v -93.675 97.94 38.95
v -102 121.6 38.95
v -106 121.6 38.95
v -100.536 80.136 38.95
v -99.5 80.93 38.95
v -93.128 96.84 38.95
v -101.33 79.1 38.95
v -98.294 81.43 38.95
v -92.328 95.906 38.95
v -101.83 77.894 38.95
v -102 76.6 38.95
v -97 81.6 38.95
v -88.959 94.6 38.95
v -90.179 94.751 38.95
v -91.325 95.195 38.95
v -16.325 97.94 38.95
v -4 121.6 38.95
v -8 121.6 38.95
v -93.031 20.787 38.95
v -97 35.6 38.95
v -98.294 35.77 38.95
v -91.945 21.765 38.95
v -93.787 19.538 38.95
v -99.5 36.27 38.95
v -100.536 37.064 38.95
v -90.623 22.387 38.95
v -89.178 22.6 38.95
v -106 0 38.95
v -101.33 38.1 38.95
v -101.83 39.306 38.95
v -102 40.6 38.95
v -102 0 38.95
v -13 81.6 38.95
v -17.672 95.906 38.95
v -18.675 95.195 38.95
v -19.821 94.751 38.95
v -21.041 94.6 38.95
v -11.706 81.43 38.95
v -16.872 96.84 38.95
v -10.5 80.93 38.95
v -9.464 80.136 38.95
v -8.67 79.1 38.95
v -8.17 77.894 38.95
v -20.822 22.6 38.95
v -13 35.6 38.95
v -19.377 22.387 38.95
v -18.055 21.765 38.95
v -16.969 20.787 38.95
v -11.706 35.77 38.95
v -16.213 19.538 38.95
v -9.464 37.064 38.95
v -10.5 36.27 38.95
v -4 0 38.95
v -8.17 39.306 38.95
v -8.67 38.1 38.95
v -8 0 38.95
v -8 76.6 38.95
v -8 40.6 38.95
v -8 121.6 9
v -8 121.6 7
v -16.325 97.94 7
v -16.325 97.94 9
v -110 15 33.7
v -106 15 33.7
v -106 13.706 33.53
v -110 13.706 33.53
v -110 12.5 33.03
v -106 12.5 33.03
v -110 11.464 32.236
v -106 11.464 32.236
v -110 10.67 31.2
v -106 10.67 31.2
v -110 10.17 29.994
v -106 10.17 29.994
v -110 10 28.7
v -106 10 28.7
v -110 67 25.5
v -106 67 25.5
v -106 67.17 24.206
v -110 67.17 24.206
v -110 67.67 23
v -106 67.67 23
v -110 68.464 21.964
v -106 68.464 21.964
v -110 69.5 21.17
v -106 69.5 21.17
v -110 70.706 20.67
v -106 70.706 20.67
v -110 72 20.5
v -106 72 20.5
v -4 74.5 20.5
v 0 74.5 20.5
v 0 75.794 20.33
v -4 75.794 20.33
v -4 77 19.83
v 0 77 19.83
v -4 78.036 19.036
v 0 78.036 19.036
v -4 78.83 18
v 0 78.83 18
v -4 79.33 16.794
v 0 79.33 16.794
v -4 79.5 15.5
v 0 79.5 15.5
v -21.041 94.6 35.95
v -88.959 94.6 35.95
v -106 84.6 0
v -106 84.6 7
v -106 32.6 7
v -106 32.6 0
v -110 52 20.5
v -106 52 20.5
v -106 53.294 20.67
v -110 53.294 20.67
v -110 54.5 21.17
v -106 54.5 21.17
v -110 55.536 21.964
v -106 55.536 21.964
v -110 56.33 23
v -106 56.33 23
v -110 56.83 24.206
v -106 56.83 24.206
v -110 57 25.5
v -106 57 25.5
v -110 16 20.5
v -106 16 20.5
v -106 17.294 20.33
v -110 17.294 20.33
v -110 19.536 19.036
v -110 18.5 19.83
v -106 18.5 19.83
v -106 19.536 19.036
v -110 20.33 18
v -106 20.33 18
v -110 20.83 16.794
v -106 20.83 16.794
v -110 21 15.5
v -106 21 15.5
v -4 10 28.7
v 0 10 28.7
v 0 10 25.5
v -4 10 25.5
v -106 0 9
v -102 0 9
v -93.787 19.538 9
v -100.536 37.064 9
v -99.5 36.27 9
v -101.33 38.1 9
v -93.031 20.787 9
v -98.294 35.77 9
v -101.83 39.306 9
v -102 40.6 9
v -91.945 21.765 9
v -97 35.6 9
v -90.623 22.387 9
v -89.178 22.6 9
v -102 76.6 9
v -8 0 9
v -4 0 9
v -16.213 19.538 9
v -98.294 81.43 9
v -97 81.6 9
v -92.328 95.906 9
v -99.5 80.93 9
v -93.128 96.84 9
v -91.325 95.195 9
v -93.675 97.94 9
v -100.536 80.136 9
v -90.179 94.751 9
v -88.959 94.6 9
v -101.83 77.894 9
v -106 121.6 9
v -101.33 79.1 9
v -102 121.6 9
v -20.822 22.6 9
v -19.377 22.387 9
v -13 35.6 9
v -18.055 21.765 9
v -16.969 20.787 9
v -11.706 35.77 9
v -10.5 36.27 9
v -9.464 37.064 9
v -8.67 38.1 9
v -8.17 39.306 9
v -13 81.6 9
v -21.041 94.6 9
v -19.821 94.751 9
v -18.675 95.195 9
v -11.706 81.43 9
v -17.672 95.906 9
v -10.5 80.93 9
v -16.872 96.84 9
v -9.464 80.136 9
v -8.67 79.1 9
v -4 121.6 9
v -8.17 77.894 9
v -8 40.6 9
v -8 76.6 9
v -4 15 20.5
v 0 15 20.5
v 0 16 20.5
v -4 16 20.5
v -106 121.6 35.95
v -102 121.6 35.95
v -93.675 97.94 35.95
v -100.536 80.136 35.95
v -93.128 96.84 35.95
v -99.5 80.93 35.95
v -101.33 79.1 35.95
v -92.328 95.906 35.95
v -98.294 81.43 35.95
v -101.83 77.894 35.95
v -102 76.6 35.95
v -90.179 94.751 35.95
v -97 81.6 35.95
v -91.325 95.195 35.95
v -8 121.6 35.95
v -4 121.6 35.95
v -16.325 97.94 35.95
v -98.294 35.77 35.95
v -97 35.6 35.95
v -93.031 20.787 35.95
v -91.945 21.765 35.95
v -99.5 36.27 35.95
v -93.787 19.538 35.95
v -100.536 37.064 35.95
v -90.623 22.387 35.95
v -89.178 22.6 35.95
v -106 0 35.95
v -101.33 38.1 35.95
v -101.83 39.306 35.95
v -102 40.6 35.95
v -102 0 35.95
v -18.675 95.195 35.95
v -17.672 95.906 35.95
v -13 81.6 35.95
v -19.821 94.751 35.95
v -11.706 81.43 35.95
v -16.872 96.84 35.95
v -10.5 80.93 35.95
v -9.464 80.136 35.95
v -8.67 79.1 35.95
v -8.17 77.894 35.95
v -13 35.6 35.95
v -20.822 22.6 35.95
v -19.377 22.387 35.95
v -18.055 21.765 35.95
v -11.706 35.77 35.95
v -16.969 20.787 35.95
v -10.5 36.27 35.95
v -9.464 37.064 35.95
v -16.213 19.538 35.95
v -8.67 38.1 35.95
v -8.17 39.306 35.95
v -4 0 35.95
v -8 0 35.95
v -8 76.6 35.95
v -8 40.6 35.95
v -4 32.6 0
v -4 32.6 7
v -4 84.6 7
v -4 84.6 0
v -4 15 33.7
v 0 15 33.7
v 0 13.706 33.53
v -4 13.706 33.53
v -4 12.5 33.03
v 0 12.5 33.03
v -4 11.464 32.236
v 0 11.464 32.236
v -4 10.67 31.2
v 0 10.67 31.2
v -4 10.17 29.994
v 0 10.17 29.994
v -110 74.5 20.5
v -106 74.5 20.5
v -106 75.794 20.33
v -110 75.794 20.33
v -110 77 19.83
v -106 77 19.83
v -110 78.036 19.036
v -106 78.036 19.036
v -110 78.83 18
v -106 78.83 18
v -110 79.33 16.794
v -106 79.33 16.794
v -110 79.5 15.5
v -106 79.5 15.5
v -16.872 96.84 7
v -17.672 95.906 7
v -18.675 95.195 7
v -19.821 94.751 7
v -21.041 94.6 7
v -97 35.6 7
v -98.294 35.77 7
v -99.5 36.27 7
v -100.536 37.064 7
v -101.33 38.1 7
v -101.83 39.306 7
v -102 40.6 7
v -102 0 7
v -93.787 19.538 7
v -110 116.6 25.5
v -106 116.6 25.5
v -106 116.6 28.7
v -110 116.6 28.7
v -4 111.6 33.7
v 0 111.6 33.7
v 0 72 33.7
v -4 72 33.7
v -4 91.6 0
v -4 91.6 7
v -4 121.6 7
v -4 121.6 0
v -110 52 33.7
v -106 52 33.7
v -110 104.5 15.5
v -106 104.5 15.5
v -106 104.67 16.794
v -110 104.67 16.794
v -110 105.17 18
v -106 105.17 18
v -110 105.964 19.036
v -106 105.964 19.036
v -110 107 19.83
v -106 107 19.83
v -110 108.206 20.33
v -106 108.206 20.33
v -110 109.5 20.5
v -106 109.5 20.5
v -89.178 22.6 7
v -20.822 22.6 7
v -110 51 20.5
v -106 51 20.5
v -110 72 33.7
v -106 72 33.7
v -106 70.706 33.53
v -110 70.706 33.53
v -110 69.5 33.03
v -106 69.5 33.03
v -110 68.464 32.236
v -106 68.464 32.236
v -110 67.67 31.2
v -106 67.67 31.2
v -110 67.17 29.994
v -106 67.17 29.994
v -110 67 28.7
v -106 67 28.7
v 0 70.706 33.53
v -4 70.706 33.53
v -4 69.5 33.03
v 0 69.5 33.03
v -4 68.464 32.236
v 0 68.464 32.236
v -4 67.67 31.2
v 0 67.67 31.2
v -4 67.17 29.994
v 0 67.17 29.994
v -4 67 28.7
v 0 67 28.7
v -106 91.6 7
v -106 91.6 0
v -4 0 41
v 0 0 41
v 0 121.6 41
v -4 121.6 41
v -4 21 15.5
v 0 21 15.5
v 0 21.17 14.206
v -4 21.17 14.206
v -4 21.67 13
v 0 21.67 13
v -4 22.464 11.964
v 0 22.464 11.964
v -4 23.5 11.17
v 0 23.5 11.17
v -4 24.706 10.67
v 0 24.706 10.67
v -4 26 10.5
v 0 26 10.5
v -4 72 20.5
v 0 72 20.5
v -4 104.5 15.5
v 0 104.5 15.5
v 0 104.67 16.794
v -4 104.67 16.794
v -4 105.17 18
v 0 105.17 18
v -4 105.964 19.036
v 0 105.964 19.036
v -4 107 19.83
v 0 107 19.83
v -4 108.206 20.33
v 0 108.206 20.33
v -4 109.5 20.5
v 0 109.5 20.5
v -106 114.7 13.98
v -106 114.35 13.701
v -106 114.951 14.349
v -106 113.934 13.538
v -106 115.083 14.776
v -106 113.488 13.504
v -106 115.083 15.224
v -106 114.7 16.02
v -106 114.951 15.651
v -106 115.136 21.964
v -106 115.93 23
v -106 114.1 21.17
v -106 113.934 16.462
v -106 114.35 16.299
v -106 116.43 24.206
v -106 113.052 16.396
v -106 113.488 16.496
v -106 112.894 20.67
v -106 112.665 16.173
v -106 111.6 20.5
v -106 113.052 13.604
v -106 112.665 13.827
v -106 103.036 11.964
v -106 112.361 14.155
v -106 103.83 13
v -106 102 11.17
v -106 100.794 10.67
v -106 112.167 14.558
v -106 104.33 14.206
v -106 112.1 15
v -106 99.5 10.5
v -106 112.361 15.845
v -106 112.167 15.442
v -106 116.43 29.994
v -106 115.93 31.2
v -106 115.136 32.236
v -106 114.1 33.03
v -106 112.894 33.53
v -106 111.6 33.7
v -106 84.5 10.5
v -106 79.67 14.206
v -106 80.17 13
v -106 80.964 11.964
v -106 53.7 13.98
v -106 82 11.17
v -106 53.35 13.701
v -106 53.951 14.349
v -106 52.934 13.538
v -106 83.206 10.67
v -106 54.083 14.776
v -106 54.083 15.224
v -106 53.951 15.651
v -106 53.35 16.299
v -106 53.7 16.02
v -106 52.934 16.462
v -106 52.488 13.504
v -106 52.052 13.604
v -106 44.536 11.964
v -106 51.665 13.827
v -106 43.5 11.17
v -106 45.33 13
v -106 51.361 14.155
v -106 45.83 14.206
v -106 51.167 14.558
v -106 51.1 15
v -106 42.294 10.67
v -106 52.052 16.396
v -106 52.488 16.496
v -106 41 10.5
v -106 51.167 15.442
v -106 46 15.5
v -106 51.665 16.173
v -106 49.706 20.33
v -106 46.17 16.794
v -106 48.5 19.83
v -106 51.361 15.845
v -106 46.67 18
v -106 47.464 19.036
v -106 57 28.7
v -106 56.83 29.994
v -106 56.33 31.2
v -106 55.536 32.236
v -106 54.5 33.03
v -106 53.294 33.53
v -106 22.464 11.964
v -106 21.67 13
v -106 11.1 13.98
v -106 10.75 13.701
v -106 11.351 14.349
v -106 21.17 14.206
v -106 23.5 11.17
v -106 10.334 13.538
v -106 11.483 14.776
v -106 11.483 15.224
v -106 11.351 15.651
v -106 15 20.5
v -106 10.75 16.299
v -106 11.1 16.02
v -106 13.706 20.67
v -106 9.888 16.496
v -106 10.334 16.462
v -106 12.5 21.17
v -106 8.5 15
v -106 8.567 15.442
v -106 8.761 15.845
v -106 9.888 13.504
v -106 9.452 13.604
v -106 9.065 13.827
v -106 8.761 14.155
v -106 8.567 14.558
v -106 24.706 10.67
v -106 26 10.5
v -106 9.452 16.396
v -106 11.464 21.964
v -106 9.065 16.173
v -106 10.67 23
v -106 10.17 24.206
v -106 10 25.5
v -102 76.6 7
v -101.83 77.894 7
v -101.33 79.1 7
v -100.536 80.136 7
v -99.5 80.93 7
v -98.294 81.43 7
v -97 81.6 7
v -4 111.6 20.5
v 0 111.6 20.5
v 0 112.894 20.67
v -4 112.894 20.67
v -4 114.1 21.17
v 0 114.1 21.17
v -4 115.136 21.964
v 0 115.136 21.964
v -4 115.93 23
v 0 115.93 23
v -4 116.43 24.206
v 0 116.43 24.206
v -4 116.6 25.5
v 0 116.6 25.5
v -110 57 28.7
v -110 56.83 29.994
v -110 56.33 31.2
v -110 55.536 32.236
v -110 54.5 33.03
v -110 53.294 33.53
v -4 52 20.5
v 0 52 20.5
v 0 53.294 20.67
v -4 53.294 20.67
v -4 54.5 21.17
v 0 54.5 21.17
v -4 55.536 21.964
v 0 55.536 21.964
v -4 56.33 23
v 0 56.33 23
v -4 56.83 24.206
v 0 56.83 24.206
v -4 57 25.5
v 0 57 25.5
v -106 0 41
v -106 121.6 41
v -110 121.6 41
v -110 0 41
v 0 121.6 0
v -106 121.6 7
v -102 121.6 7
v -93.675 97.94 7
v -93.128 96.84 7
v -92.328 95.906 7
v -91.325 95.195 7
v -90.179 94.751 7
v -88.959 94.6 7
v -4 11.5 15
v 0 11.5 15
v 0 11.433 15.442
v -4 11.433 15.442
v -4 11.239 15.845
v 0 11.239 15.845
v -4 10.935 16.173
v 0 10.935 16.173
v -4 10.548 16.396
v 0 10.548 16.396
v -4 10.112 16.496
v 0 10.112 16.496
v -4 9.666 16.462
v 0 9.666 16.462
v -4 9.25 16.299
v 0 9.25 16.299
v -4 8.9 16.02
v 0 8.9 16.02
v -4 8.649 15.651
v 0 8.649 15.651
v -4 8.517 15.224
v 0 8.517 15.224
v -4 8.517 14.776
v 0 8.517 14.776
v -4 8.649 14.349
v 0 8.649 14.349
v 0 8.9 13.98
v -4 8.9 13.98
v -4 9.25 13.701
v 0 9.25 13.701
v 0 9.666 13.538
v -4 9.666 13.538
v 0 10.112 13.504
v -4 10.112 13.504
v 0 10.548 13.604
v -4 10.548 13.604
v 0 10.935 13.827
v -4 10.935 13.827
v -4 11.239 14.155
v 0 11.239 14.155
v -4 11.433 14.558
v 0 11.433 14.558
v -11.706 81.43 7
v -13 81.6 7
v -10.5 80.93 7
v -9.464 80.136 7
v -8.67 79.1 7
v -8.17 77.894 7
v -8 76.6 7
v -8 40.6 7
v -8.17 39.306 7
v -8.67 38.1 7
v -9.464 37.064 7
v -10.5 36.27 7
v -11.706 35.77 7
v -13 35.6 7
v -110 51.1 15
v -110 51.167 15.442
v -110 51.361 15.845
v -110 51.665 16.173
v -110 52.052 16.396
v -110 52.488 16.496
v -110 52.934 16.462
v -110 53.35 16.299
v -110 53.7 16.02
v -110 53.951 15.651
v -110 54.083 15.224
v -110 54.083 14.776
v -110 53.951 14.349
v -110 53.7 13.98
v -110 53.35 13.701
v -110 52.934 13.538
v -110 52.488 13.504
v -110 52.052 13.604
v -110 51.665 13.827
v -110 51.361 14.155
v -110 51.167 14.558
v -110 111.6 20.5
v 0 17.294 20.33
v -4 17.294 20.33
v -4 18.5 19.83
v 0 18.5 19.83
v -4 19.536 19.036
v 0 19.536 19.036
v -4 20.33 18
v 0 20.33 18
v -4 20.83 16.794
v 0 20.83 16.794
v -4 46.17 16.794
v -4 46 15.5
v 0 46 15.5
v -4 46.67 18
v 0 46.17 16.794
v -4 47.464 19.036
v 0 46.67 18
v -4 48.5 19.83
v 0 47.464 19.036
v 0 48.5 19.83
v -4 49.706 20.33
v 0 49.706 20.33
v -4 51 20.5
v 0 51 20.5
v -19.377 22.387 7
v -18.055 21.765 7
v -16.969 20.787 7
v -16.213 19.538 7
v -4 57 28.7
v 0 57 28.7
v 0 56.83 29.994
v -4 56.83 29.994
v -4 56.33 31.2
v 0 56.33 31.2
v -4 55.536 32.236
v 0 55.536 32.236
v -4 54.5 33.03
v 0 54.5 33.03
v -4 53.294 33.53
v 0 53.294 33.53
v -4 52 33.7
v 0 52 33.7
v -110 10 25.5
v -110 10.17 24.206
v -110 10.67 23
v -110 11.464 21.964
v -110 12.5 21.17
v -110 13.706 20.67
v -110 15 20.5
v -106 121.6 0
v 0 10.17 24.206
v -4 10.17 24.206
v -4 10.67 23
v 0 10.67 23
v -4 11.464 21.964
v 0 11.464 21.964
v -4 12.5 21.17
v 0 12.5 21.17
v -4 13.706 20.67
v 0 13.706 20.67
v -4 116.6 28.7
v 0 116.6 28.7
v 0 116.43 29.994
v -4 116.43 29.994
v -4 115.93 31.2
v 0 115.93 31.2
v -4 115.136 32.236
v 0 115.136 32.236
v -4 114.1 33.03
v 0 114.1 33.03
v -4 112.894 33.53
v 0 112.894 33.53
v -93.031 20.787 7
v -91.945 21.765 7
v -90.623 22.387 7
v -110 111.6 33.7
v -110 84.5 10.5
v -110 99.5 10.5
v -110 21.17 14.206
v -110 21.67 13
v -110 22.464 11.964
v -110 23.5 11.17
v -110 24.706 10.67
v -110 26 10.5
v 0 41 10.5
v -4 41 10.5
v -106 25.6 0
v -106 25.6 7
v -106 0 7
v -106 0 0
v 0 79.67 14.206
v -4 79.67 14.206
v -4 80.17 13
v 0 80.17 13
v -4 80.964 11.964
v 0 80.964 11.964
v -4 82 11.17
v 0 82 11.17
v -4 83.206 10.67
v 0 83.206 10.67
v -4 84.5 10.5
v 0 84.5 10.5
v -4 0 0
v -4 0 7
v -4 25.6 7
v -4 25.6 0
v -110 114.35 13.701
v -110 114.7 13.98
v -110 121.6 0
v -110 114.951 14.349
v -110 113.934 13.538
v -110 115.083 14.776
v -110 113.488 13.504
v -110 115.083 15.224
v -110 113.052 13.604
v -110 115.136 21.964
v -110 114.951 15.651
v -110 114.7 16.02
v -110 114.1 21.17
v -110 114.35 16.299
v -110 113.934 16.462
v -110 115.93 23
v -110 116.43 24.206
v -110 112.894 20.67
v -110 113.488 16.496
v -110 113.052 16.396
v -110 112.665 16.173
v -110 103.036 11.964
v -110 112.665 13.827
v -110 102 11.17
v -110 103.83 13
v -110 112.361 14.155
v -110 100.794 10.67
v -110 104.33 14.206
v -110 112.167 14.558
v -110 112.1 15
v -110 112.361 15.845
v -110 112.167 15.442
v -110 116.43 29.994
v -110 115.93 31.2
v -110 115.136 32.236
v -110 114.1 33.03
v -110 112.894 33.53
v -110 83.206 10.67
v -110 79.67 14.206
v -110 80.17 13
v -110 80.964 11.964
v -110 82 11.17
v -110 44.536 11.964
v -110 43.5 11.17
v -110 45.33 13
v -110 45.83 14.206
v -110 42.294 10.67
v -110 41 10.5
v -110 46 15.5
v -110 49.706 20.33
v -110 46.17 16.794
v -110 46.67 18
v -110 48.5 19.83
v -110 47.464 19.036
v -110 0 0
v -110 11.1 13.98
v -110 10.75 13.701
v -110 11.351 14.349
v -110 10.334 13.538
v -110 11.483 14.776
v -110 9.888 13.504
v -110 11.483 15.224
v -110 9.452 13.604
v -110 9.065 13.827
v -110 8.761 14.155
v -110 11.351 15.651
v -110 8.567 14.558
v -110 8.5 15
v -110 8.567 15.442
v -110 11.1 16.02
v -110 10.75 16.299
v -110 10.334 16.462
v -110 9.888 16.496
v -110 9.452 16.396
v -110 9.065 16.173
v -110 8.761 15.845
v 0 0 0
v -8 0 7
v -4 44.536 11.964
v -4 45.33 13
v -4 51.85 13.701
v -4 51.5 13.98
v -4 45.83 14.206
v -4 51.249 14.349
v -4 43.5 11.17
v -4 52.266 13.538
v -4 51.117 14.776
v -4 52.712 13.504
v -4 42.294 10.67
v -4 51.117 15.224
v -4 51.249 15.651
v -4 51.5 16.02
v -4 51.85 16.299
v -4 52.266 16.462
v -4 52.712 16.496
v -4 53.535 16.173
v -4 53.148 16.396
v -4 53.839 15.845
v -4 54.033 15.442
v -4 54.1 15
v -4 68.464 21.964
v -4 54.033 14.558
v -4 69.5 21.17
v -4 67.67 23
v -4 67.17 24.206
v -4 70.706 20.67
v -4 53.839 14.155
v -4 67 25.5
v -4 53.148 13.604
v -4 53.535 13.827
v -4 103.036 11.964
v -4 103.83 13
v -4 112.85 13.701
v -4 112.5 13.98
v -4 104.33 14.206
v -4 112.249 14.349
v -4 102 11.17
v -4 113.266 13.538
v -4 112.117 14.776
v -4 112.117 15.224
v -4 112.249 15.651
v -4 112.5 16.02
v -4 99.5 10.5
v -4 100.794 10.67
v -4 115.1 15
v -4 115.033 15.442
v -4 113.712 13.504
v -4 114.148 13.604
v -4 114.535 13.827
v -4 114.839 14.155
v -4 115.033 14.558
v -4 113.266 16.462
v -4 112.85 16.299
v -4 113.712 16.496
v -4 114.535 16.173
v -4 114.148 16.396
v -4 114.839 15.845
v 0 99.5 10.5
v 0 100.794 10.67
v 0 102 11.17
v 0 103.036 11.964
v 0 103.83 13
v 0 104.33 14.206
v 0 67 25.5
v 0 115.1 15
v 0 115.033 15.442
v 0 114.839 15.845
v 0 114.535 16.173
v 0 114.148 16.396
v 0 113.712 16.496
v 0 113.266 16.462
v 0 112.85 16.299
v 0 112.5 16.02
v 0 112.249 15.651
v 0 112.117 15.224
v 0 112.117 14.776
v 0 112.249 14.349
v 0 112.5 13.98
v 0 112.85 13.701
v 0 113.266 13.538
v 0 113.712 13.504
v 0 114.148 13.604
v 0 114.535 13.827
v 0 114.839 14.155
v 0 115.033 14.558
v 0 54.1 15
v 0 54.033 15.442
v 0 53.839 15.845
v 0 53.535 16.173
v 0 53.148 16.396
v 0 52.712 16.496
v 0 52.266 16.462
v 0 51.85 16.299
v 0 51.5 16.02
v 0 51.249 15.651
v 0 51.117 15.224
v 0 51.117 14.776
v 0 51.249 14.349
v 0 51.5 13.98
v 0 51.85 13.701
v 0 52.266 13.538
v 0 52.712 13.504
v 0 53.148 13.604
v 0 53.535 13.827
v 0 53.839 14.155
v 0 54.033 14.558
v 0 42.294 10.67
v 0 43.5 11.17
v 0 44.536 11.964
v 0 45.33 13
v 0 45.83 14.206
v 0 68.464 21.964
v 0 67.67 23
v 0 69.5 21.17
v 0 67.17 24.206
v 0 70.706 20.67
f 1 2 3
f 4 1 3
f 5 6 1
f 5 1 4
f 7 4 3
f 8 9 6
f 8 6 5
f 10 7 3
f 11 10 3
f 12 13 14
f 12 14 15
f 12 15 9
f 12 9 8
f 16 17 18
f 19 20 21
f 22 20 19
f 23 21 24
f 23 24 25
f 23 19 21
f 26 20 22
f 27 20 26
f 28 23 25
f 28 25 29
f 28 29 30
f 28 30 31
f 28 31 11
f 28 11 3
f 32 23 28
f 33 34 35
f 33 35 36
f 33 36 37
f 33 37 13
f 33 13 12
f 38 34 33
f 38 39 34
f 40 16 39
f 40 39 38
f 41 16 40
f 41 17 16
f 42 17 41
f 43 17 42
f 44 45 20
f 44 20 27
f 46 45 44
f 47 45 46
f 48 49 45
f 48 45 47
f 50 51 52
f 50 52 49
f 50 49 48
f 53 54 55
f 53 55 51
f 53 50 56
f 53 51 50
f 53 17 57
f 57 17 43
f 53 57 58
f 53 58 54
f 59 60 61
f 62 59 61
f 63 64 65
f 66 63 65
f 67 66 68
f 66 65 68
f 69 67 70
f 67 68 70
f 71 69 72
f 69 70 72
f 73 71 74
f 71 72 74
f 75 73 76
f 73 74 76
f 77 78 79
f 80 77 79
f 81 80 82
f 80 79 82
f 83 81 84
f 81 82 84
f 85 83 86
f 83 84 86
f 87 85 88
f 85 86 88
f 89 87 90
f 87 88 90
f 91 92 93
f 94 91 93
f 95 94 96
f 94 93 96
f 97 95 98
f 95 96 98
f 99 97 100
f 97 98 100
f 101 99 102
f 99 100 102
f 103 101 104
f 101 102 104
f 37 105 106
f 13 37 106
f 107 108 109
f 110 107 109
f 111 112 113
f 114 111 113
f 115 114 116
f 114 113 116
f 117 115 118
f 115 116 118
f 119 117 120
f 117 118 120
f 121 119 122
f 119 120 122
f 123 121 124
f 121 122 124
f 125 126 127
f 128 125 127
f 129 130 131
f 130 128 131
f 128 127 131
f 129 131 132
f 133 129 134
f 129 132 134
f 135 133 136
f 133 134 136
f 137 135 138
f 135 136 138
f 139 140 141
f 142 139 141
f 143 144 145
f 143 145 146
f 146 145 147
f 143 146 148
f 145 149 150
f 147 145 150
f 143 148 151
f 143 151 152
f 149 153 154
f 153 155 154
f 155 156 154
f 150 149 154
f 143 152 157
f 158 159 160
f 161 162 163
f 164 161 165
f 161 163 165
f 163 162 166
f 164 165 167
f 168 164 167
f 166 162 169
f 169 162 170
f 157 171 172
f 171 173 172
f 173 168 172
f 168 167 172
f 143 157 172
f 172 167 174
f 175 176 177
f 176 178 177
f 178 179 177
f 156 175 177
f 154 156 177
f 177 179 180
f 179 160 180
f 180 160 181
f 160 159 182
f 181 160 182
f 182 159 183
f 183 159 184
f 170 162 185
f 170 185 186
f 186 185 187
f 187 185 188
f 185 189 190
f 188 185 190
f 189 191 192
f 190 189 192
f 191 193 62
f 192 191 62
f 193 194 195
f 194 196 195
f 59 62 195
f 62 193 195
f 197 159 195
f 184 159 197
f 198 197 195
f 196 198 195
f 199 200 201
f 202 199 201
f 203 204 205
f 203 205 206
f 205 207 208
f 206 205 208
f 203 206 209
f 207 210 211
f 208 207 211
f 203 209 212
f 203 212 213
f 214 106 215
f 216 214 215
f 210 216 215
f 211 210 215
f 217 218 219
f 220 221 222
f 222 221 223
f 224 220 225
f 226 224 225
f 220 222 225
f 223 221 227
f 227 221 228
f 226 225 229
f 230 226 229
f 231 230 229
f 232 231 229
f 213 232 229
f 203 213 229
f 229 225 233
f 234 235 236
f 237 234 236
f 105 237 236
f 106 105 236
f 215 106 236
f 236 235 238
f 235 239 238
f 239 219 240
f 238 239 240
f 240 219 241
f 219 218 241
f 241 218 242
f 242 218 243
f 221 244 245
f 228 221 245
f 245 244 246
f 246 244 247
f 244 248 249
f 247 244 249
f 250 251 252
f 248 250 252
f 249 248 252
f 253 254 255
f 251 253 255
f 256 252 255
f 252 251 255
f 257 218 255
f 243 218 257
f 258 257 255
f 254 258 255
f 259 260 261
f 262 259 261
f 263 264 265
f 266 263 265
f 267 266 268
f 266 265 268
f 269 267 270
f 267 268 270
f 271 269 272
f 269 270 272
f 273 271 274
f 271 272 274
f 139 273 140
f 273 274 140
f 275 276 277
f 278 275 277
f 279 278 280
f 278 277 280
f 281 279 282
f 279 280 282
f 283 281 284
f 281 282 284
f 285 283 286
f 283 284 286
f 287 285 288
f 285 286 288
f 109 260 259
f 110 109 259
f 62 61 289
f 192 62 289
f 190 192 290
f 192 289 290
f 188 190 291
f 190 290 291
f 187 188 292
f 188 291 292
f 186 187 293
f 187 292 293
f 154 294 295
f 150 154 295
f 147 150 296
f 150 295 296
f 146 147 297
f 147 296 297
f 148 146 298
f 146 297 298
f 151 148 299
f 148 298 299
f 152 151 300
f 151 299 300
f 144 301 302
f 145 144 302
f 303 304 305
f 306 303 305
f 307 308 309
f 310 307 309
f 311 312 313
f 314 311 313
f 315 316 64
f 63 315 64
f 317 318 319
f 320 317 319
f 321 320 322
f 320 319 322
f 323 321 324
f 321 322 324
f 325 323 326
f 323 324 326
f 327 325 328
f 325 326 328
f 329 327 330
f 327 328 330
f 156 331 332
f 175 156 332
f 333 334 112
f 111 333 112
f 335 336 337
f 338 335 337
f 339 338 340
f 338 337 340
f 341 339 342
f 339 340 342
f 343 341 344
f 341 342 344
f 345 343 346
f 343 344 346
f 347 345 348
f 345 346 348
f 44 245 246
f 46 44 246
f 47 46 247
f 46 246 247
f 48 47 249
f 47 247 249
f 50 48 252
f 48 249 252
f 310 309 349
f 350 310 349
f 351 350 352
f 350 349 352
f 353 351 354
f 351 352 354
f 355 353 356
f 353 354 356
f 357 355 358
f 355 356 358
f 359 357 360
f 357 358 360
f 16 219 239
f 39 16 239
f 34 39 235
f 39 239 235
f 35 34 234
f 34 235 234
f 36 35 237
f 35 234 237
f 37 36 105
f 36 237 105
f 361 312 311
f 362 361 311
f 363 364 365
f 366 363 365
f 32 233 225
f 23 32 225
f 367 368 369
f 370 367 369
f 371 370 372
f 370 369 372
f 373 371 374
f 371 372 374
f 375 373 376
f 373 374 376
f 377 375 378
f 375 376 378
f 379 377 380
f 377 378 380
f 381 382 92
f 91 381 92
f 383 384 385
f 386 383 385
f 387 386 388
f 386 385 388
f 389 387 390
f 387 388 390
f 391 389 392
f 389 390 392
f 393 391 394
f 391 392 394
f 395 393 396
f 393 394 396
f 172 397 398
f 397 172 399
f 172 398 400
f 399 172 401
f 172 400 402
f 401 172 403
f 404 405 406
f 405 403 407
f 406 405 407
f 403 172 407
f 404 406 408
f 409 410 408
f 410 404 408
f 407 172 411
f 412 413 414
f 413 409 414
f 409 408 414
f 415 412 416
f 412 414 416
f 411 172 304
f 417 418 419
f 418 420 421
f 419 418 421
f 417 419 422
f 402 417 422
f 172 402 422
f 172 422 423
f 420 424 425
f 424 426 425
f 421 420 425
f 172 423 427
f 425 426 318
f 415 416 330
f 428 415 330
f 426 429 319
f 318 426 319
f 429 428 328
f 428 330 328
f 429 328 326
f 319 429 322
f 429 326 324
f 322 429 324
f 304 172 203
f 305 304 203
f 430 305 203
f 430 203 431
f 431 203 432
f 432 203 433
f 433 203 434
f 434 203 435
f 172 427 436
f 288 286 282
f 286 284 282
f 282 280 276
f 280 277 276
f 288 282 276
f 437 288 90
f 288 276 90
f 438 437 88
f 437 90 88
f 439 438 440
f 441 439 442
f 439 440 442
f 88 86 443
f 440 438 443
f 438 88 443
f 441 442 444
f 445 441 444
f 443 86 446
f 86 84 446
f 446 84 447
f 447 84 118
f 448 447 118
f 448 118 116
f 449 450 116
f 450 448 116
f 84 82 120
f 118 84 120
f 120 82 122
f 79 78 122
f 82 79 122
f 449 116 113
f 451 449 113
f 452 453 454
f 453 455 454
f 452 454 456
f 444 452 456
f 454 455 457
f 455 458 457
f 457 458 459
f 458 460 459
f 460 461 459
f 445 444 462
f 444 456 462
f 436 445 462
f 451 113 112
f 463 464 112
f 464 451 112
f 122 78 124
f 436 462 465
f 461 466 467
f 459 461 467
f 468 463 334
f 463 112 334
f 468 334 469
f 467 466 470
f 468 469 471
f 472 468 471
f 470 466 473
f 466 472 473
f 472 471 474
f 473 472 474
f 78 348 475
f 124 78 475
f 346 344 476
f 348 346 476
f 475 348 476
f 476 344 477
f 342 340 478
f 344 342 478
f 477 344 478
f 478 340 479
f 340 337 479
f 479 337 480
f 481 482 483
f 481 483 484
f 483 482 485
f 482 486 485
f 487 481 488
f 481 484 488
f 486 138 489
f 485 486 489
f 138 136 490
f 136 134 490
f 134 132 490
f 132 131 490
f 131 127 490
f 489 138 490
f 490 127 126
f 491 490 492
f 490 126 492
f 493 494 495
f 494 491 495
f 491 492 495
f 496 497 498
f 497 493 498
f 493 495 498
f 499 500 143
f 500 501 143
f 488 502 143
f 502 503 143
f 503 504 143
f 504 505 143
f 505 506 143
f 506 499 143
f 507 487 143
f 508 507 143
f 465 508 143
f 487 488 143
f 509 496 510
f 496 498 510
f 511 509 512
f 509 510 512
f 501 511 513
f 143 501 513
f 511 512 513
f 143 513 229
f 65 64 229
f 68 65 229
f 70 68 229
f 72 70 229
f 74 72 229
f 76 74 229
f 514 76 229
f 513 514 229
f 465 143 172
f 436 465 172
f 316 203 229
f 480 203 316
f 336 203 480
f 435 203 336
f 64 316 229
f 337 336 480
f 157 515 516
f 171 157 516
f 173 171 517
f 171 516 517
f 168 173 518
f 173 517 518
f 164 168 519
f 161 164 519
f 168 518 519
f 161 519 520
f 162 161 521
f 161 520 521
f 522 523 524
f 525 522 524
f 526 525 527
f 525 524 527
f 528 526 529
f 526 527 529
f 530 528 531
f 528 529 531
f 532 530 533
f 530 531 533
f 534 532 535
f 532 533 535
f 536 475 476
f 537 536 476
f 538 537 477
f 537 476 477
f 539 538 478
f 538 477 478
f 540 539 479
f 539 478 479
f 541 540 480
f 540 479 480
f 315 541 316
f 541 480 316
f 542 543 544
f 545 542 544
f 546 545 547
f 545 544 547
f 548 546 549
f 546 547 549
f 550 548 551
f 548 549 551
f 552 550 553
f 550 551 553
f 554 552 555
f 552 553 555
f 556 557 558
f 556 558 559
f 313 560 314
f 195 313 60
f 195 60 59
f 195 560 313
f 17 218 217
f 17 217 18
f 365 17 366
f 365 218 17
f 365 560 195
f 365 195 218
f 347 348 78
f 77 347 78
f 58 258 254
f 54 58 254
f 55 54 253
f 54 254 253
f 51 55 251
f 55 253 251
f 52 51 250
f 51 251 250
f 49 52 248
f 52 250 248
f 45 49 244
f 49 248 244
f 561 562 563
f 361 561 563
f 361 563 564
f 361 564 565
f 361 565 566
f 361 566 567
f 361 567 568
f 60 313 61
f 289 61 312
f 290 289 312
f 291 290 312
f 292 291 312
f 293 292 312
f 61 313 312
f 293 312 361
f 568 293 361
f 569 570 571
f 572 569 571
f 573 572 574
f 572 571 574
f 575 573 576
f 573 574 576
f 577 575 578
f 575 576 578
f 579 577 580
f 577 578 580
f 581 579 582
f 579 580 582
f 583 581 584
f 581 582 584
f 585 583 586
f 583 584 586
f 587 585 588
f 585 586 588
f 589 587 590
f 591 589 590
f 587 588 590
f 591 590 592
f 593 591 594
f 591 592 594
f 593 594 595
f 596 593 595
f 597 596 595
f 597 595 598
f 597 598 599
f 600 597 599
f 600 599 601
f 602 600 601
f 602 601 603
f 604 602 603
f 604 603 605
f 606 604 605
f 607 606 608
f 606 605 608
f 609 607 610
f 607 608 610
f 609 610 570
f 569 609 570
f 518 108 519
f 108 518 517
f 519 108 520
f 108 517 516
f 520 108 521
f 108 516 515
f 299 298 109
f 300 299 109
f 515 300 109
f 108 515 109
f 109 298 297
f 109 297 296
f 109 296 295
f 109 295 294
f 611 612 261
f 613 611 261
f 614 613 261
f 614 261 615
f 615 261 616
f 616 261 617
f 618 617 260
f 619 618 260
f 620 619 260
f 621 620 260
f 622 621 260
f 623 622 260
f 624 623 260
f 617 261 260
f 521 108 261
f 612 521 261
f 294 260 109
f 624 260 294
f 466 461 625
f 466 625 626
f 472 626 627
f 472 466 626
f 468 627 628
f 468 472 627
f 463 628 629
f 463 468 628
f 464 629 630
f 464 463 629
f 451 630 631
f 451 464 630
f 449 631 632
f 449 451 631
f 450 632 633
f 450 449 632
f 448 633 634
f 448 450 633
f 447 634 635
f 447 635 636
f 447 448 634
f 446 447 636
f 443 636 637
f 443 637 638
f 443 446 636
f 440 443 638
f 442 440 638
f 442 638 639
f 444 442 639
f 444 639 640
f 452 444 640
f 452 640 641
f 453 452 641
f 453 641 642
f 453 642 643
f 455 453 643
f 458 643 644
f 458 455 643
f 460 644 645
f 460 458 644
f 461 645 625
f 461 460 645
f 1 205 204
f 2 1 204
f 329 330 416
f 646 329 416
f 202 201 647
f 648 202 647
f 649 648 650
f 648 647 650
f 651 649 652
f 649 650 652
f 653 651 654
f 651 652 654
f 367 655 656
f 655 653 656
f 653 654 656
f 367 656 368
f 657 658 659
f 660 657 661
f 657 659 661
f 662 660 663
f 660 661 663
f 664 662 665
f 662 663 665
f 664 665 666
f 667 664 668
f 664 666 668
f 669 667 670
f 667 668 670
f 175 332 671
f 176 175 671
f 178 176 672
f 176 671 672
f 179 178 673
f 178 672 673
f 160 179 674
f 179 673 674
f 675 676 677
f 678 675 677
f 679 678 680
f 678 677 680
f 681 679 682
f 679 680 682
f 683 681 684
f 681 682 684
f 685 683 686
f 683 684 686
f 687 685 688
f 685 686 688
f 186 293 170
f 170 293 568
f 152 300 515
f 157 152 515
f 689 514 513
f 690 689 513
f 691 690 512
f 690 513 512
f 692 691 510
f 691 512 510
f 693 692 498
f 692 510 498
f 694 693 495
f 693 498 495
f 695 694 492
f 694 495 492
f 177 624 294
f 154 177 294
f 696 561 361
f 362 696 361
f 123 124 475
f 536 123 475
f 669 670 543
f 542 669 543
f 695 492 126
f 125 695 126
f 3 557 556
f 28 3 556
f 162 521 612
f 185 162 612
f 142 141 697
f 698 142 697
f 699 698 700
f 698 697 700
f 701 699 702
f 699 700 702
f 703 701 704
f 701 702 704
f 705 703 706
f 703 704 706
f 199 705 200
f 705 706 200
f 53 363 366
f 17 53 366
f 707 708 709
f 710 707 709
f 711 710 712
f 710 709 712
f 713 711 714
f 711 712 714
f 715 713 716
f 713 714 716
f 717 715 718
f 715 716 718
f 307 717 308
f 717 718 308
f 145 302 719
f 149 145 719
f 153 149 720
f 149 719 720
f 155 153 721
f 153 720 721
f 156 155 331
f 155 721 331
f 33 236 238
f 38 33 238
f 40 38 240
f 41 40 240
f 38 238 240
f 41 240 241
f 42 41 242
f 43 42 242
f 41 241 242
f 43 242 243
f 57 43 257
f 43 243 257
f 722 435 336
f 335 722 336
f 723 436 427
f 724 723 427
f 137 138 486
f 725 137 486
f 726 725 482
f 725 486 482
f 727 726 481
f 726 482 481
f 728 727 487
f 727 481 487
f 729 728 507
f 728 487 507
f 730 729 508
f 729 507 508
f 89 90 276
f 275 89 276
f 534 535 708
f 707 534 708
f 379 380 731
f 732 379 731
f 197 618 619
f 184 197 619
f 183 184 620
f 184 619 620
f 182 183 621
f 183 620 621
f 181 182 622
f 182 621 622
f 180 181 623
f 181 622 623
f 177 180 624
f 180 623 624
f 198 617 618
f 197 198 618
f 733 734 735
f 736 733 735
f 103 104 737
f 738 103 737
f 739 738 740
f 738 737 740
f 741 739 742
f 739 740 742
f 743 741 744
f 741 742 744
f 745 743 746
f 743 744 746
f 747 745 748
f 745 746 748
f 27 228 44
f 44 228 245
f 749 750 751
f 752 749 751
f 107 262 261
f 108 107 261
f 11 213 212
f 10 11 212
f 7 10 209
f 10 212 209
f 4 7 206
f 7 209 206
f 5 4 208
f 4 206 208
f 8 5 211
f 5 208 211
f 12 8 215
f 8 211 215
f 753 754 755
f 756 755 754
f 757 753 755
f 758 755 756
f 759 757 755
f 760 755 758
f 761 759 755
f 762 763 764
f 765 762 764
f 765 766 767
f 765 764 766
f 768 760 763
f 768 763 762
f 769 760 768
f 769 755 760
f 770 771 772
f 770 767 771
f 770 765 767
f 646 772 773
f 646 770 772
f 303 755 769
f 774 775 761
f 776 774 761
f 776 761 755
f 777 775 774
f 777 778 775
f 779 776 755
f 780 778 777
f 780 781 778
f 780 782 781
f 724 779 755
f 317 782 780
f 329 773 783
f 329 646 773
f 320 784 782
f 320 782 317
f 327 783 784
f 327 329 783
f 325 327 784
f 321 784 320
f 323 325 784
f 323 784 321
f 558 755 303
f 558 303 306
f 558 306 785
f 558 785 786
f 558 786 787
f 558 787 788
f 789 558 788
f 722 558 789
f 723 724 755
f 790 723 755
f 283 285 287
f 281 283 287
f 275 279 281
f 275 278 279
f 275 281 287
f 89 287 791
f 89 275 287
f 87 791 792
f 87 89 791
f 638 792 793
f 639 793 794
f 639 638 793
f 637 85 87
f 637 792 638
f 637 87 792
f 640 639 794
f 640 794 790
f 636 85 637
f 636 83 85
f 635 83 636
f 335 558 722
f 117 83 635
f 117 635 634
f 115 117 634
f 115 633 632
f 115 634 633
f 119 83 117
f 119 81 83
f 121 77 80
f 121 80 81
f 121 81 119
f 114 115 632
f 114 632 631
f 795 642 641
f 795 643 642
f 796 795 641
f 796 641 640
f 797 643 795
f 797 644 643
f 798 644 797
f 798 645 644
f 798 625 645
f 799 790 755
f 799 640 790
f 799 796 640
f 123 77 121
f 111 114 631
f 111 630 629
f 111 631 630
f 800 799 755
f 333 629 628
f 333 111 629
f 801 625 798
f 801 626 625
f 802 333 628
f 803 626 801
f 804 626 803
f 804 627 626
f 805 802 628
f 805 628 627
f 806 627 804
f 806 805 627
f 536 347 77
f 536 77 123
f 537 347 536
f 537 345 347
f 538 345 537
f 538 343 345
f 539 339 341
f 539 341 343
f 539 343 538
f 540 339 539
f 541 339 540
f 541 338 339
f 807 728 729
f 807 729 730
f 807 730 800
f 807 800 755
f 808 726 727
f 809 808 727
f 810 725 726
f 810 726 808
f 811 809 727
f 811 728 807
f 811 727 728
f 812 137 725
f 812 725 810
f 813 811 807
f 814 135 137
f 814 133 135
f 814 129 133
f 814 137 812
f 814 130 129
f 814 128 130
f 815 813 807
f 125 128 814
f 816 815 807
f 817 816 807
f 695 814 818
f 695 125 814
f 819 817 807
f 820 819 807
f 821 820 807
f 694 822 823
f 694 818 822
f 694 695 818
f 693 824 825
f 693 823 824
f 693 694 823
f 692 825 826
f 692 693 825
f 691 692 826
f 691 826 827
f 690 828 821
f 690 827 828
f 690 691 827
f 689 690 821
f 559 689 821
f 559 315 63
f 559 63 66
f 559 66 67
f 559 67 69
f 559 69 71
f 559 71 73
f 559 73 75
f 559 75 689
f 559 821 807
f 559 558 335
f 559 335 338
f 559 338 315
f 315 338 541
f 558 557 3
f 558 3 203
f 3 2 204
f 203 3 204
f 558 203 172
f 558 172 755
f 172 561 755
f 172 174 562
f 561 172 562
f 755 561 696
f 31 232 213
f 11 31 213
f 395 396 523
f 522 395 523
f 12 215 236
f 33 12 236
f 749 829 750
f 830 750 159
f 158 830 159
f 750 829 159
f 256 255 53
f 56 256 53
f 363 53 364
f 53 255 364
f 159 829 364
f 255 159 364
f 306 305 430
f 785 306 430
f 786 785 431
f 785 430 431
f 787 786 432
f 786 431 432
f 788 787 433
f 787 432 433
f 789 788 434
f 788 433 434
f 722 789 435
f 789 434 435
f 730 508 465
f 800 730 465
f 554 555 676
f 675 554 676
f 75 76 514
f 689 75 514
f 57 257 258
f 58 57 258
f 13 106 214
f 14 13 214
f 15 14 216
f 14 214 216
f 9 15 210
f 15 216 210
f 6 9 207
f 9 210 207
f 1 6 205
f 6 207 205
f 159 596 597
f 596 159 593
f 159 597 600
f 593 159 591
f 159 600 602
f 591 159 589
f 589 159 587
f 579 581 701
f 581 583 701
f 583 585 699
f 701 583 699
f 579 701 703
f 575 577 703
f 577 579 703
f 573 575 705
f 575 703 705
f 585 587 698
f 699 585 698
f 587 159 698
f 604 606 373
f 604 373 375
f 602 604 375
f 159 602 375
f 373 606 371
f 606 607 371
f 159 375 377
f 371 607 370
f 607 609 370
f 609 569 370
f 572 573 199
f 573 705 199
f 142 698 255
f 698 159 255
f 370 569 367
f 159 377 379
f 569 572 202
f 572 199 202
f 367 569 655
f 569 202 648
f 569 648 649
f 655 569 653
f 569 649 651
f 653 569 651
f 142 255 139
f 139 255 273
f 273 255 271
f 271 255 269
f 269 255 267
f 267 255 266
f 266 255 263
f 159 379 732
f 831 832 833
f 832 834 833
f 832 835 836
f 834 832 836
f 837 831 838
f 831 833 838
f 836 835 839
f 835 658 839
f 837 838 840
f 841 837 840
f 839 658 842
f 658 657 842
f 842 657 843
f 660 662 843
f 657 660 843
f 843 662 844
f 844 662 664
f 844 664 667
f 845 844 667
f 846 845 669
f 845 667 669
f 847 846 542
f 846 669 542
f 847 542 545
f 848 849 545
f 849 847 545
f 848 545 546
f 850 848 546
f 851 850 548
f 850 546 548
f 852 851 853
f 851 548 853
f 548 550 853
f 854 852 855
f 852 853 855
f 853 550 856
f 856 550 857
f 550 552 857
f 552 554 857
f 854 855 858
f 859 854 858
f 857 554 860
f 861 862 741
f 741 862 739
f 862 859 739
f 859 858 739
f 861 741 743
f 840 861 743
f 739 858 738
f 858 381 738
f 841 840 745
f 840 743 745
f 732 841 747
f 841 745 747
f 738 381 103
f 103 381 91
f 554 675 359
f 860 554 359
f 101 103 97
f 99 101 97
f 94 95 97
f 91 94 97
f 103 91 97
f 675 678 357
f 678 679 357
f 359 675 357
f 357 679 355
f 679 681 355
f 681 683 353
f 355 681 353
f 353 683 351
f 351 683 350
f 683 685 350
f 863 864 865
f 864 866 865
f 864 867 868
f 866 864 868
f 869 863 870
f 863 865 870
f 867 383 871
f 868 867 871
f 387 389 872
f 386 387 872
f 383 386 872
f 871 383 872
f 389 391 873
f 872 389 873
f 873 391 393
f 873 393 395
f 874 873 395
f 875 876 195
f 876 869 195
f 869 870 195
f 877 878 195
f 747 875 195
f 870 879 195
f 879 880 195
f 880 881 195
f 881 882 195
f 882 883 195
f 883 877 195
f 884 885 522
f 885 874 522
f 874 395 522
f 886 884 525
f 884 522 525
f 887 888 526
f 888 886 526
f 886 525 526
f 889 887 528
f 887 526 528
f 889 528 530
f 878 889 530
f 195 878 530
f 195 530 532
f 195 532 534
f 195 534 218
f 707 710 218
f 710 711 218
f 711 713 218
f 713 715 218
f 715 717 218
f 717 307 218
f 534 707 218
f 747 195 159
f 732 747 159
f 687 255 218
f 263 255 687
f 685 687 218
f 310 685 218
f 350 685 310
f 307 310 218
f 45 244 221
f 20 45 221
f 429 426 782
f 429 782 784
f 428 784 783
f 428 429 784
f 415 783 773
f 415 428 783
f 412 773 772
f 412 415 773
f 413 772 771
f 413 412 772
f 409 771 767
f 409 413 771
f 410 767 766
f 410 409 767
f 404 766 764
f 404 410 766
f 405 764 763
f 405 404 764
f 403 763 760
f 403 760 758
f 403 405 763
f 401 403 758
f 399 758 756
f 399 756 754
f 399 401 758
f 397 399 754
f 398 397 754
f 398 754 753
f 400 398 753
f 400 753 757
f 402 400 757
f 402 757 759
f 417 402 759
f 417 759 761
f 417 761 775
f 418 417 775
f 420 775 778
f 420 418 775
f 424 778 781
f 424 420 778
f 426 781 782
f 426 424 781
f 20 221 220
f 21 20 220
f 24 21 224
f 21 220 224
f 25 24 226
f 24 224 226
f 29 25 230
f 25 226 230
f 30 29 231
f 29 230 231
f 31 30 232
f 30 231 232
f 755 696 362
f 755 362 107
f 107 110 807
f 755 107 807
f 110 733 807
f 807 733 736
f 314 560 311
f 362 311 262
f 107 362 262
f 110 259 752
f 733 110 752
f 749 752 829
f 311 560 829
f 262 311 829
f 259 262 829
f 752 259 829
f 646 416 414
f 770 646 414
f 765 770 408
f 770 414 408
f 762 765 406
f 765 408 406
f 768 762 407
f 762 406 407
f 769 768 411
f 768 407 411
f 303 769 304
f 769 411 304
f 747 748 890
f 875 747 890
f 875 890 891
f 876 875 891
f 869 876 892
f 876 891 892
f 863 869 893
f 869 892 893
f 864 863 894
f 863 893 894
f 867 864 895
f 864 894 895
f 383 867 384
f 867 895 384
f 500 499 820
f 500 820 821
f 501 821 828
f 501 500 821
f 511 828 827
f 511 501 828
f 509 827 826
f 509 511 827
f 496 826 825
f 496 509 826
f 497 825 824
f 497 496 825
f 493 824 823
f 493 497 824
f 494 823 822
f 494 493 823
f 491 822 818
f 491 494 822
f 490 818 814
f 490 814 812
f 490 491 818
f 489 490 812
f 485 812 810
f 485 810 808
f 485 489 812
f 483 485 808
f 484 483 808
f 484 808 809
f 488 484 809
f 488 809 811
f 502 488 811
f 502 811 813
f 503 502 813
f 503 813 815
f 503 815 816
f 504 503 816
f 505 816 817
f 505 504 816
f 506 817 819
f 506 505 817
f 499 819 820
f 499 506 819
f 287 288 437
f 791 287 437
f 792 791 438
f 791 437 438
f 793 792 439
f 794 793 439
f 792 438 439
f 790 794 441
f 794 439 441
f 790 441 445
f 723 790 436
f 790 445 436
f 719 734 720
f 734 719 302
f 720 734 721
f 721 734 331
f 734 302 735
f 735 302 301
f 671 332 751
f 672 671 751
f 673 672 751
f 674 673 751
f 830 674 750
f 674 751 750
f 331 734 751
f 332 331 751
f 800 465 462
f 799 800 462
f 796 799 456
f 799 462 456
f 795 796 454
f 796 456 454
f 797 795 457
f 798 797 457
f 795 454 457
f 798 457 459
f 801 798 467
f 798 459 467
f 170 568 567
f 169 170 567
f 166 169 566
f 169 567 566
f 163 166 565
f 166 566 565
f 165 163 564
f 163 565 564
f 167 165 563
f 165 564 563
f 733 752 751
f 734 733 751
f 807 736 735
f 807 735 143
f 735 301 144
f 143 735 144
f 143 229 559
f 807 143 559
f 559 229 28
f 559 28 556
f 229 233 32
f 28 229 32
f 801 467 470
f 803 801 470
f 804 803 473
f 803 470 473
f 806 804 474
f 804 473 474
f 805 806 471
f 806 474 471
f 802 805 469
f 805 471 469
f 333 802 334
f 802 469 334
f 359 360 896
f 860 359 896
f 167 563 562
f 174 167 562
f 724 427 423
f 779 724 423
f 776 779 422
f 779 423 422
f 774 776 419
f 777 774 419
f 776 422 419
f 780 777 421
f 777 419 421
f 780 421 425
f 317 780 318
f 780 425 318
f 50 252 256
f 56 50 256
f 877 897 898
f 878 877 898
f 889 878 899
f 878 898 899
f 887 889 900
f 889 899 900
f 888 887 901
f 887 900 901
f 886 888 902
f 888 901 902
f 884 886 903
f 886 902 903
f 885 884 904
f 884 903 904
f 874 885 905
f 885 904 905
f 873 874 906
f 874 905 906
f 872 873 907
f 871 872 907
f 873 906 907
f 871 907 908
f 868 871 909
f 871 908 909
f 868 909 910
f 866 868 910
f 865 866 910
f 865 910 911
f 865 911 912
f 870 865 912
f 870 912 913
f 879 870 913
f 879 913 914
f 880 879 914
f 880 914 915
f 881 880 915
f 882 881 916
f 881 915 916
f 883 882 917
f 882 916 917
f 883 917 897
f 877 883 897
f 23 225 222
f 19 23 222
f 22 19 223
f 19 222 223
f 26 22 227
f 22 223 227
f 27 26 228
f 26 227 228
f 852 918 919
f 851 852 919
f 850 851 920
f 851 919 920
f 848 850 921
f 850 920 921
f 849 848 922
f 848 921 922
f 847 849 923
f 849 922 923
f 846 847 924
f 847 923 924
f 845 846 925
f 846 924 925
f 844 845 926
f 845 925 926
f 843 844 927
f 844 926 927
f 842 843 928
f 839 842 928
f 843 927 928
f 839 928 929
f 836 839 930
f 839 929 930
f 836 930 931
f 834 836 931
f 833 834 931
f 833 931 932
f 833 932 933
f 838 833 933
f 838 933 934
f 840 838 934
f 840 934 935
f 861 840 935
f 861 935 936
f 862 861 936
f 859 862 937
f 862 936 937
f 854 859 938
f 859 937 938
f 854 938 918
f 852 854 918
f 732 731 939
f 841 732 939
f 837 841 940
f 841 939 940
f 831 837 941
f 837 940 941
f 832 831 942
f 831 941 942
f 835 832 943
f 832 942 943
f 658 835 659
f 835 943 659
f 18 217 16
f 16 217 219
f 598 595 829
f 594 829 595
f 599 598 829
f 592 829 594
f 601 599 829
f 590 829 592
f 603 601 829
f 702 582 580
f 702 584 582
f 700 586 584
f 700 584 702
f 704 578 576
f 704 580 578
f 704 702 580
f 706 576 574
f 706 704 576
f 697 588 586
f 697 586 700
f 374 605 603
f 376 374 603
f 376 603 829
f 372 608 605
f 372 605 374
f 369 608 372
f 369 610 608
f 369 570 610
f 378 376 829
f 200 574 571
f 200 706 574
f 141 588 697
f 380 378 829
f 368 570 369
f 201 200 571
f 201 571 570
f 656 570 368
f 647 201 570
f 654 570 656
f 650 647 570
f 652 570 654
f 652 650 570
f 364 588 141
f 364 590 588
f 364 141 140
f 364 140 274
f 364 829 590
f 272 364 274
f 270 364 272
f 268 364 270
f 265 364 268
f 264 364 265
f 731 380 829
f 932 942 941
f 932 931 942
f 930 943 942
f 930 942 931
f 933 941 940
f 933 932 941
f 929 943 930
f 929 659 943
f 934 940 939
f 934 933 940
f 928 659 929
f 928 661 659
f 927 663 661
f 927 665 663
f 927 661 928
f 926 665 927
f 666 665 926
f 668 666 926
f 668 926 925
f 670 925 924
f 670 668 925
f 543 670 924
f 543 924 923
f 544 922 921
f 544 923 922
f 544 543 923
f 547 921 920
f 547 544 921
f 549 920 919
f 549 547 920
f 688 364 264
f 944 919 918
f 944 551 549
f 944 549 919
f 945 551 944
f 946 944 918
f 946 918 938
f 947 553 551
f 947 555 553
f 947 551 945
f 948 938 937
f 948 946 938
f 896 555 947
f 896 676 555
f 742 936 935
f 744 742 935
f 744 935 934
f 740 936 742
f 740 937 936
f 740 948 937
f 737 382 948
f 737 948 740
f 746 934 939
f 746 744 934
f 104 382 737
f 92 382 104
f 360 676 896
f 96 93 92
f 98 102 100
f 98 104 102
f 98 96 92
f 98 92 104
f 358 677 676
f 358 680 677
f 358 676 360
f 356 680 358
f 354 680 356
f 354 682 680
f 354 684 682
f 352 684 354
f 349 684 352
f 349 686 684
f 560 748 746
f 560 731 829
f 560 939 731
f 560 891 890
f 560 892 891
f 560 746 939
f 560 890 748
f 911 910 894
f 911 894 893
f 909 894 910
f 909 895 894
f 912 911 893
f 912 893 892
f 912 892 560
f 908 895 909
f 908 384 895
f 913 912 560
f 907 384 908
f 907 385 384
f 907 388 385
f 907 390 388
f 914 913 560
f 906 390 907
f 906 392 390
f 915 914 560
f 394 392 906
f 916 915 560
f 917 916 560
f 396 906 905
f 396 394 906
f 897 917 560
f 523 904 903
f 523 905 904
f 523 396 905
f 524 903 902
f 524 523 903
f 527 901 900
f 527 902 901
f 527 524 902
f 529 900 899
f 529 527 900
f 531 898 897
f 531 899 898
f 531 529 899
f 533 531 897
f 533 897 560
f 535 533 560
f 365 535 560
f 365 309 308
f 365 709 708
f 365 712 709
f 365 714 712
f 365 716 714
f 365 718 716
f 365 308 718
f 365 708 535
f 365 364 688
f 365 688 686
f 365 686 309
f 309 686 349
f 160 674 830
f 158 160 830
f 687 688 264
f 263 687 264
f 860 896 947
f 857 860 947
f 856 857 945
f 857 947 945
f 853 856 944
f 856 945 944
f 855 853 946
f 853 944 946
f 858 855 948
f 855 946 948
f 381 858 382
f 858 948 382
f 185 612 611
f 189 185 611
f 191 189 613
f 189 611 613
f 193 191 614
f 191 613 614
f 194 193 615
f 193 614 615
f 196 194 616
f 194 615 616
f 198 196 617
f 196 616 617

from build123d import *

# Parameters (mm, degrees)
F0_W     = 121.6
F0_H     = 41
F0_R     = 1.5
F1_DEPTH = 4
F2_W     = 121.6
F2_H     = 3
F3_DEPTH = 102
F5_DEPTH = 34.001
F6_W     = 121.6
F6_H     = 35.95
F6_R     = 1.5
F6_H_2   = 2.05
F6_H_3   = 3
F7_DEPTH = 4
F9_DEPTH = 110.001


with BuildPart() as f1:
    # F0 (on Right) → F1 (new body)
    with BuildSketch(Plane.YZ):
        with Locations((60.8, 20.5)):
            Rectangle(F0_W, F0_H)
        with Locations((10, 15)):
            Circle(F0_R, mode=Mode.SUBTRACT)
        with Locations((52.6, 15)):
            Circle(F0_R, mode=Mode.SUBTRACT)
        with Locations((113.6, 15)):
            Circle(F0_R, mode=Mode.SUBTRACT)
    extrude(amount=-F1_DEPTH)

    # F2 (on face) → F3 (join)
    with BuildSketch(Plane(origin=(-4, 0, 0), x_dir=(0, -1, 0), z_dir=(-1, 0, 0))):
        Polygon((0, 7), (0, 9), (-121.6, 9), (-121.6, 7), (-91.6, 7), (-91.6, 0), (-84.6, 0), (-84.6, 7), (-32.6, 7), (-32.6, 0), (-25.6, 0), (-25.6, 7), align=None)
        with Locations((-60.8, 37.45)):
            Rectangle(F2_W, F2_H)
    extrude(amount=F3_DEPTH)

    # F4 (on face) → F5 (cut, through all)
    with BuildSketch(Plane(origin=(0, 0, 7), x_dir=(1, 0, 0), z_dir=(0, 0, -1))):
        with BuildLine():
            Line((-8, -76.6), (-8, -40.6))
            ThreePointArc((-8, -40.6), (-9.4644660941, -37.0644660941), (-13, -35.6))
            Line((-13, -35.6), (-97, -35.6))
            ThreePointArc((-97, -35.6), (-100.5355339059, -37.0644660941), (-102, -40.6))
            Line((-102, -40.6), (-102, -76.6))
            ThreePointArc((-102, -76.6), (-100.5355339059, -80.1355339059), (-97, -81.6))
            Line((-97, -81.6), (-13, -81.6))
            ThreePointArc((-13, -81.6), (-9.4644660941, -80.1355339059), (-8, -76.6))
        make_face()
        with BuildLine():
            Line((-8, 0), (-102, 0))
            Line((-102, 0), (-93.7873133496, -19.5375492948))
            ThreePointArc((-93.7873133496, -19.5375492948), (-91.9449562371, -21.764597608), (-89.1779855536, -22.6))
            Line((-89.1779855536, -22.6), (-20.8220144464, -22.6))
            ThreePointArc((-20.8220144464, -22.6), (-18.0550437629, -21.764597608), (-16.2126866504, -19.5375492948))
            Line((-16.2126866504, -19.5375492948), (-8, 0))
        make_face()
        with BuildLine():
            Line((-8, -121.6), (-16.3246498167, -97.940468942))
            ThreePointArc((-16.3246498167, -97.940468942), (-18.1513722675, -95.5197025053), (-21.0412117709, -94.6))
            Line((-21.0412117709, -94.6), (-88.9587882291, -94.6))
            ThreePointArc((-88.9587882291, -94.6), (-91.8486277325, -95.5197025053), (-93.6753501833, -97.940468942))
            Line((-93.6753501833, -97.940468942), (-102, -121.6))
            Line((-102, -121.6), (-8, -121.6))
        make_face()
    extrude(amount=-F5_DEPTH, mode=Mode.SUBTRACT)

    # F6 (on face) → F7 (join)
    with BuildSketch(Plane(origin=(-106, 0, 0), x_dir=(0, -1, 0), z_dir=(-1, 0, 0))):
        with Locations((-60.8, 17.975)):
            Rectangle(F6_W, F6_H)
        with Locations((-113.6, 15)):
            Circle(F6_R, mode=Mode.SUBTRACT)
        with Locations((-52.6, 15)):
            Circle(F6_R, mode=Mode.SUBTRACT)
        with Locations((-10, 15)):
            Circle(F6_R, mode=Mode.SUBTRACT)
        with Locations((-60.8, 39.975)):
            Rectangle(F6_W, F6_H_2)
        with Locations((-60.8, 37.45)):
            Rectangle(F6_W, F6_H_3)
    extrude(amount=F7_DEPTH)

    # F8 (on Right) → F9 (cut, through all)
    with BuildSketch(Plane.YZ):
        with BuildLine():
            Line((52, 33.7), (15, 33.7))
            ThreePointArc((15, 33.7), (11.4644660941, 32.2355339059), (10, 28.7))
            Line((10, 28.7), (10, 25.5))
            ThreePointArc((10, 25.5), (11.4644660941, 21.9644660941), (15, 20.5))
            Line((15, 20.5), (16, 20.5))
            ThreePointArc((16, 20.5), (19.5355339059, 19.0355339059), (21, 15.5))
            ThreePointArc((21, 15.5), (22.4644660941, 11.9644660941), (26, 10.5))
            Line((26, 10.5), (41, 10.5))
            ThreePointArc((41, 10.5), (44.5355339059, 11.9644660941), (46, 15.5))
            ThreePointArc((46, 15.5), (47.4644660941, 19.0355339059), (51, 20.5))
            Line((51, 20.5), (52, 20.5))
            ThreePointArc((52, 20.5), (55.5355339059, 21.9644660941), (57, 25.5))
            Line((57, 25.5), (57, 28.7))
            ThreePointArc((57, 28.7), (55.5355339059, 32.2355339059), (52, 33.7))
        make_face()
        with BuildLine():
            Line((111.6, 33.7), (72, 33.7))
            ThreePointArc((72, 33.7), (68.4644660941, 32.2355339059), (67, 28.7))
            Line((67, 28.7), (67, 25.5))
            ThreePointArc((67, 25.5), (68.4644660941, 21.9644660941), (72, 20.5))
            Line((72, 20.5), (74.5, 20.5))
            ThreePointArc((74.5, 20.5), (78.0355339059, 19.0355339059), (79.5, 15.5))
            ThreePointArc((79.5, 15.5), (80.9644660941, 11.9644660941), (84.5, 10.5))
            Line((84.5, 10.5), (99.5, 10.5))
            ThreePointArc((99.5, 10.5), (103.0355339059, 11.9644660941), (104.5, 15.5))
            ThreePointArc((104.5, 15.5), (105.9644660941, 19.0355339059), (109.5, 20.5))
            Line((109.5, 20.5), (111.6, 20.5))
            ThreePointArc((111.6, 20.5), (115.1355339059, 21.9644660941), (116.6, 25.5))
            Line((116.6, 25.5), (116.6, 28.7))
            ThreePointArc((116.6, 28.7), (115.1355339059, 32.2355339059), (111.6, 33.7))
        make_face()
    extrude(amount=-F9_DEPTH, mode=Mode.SUBTRACT)


solid = f1.part
